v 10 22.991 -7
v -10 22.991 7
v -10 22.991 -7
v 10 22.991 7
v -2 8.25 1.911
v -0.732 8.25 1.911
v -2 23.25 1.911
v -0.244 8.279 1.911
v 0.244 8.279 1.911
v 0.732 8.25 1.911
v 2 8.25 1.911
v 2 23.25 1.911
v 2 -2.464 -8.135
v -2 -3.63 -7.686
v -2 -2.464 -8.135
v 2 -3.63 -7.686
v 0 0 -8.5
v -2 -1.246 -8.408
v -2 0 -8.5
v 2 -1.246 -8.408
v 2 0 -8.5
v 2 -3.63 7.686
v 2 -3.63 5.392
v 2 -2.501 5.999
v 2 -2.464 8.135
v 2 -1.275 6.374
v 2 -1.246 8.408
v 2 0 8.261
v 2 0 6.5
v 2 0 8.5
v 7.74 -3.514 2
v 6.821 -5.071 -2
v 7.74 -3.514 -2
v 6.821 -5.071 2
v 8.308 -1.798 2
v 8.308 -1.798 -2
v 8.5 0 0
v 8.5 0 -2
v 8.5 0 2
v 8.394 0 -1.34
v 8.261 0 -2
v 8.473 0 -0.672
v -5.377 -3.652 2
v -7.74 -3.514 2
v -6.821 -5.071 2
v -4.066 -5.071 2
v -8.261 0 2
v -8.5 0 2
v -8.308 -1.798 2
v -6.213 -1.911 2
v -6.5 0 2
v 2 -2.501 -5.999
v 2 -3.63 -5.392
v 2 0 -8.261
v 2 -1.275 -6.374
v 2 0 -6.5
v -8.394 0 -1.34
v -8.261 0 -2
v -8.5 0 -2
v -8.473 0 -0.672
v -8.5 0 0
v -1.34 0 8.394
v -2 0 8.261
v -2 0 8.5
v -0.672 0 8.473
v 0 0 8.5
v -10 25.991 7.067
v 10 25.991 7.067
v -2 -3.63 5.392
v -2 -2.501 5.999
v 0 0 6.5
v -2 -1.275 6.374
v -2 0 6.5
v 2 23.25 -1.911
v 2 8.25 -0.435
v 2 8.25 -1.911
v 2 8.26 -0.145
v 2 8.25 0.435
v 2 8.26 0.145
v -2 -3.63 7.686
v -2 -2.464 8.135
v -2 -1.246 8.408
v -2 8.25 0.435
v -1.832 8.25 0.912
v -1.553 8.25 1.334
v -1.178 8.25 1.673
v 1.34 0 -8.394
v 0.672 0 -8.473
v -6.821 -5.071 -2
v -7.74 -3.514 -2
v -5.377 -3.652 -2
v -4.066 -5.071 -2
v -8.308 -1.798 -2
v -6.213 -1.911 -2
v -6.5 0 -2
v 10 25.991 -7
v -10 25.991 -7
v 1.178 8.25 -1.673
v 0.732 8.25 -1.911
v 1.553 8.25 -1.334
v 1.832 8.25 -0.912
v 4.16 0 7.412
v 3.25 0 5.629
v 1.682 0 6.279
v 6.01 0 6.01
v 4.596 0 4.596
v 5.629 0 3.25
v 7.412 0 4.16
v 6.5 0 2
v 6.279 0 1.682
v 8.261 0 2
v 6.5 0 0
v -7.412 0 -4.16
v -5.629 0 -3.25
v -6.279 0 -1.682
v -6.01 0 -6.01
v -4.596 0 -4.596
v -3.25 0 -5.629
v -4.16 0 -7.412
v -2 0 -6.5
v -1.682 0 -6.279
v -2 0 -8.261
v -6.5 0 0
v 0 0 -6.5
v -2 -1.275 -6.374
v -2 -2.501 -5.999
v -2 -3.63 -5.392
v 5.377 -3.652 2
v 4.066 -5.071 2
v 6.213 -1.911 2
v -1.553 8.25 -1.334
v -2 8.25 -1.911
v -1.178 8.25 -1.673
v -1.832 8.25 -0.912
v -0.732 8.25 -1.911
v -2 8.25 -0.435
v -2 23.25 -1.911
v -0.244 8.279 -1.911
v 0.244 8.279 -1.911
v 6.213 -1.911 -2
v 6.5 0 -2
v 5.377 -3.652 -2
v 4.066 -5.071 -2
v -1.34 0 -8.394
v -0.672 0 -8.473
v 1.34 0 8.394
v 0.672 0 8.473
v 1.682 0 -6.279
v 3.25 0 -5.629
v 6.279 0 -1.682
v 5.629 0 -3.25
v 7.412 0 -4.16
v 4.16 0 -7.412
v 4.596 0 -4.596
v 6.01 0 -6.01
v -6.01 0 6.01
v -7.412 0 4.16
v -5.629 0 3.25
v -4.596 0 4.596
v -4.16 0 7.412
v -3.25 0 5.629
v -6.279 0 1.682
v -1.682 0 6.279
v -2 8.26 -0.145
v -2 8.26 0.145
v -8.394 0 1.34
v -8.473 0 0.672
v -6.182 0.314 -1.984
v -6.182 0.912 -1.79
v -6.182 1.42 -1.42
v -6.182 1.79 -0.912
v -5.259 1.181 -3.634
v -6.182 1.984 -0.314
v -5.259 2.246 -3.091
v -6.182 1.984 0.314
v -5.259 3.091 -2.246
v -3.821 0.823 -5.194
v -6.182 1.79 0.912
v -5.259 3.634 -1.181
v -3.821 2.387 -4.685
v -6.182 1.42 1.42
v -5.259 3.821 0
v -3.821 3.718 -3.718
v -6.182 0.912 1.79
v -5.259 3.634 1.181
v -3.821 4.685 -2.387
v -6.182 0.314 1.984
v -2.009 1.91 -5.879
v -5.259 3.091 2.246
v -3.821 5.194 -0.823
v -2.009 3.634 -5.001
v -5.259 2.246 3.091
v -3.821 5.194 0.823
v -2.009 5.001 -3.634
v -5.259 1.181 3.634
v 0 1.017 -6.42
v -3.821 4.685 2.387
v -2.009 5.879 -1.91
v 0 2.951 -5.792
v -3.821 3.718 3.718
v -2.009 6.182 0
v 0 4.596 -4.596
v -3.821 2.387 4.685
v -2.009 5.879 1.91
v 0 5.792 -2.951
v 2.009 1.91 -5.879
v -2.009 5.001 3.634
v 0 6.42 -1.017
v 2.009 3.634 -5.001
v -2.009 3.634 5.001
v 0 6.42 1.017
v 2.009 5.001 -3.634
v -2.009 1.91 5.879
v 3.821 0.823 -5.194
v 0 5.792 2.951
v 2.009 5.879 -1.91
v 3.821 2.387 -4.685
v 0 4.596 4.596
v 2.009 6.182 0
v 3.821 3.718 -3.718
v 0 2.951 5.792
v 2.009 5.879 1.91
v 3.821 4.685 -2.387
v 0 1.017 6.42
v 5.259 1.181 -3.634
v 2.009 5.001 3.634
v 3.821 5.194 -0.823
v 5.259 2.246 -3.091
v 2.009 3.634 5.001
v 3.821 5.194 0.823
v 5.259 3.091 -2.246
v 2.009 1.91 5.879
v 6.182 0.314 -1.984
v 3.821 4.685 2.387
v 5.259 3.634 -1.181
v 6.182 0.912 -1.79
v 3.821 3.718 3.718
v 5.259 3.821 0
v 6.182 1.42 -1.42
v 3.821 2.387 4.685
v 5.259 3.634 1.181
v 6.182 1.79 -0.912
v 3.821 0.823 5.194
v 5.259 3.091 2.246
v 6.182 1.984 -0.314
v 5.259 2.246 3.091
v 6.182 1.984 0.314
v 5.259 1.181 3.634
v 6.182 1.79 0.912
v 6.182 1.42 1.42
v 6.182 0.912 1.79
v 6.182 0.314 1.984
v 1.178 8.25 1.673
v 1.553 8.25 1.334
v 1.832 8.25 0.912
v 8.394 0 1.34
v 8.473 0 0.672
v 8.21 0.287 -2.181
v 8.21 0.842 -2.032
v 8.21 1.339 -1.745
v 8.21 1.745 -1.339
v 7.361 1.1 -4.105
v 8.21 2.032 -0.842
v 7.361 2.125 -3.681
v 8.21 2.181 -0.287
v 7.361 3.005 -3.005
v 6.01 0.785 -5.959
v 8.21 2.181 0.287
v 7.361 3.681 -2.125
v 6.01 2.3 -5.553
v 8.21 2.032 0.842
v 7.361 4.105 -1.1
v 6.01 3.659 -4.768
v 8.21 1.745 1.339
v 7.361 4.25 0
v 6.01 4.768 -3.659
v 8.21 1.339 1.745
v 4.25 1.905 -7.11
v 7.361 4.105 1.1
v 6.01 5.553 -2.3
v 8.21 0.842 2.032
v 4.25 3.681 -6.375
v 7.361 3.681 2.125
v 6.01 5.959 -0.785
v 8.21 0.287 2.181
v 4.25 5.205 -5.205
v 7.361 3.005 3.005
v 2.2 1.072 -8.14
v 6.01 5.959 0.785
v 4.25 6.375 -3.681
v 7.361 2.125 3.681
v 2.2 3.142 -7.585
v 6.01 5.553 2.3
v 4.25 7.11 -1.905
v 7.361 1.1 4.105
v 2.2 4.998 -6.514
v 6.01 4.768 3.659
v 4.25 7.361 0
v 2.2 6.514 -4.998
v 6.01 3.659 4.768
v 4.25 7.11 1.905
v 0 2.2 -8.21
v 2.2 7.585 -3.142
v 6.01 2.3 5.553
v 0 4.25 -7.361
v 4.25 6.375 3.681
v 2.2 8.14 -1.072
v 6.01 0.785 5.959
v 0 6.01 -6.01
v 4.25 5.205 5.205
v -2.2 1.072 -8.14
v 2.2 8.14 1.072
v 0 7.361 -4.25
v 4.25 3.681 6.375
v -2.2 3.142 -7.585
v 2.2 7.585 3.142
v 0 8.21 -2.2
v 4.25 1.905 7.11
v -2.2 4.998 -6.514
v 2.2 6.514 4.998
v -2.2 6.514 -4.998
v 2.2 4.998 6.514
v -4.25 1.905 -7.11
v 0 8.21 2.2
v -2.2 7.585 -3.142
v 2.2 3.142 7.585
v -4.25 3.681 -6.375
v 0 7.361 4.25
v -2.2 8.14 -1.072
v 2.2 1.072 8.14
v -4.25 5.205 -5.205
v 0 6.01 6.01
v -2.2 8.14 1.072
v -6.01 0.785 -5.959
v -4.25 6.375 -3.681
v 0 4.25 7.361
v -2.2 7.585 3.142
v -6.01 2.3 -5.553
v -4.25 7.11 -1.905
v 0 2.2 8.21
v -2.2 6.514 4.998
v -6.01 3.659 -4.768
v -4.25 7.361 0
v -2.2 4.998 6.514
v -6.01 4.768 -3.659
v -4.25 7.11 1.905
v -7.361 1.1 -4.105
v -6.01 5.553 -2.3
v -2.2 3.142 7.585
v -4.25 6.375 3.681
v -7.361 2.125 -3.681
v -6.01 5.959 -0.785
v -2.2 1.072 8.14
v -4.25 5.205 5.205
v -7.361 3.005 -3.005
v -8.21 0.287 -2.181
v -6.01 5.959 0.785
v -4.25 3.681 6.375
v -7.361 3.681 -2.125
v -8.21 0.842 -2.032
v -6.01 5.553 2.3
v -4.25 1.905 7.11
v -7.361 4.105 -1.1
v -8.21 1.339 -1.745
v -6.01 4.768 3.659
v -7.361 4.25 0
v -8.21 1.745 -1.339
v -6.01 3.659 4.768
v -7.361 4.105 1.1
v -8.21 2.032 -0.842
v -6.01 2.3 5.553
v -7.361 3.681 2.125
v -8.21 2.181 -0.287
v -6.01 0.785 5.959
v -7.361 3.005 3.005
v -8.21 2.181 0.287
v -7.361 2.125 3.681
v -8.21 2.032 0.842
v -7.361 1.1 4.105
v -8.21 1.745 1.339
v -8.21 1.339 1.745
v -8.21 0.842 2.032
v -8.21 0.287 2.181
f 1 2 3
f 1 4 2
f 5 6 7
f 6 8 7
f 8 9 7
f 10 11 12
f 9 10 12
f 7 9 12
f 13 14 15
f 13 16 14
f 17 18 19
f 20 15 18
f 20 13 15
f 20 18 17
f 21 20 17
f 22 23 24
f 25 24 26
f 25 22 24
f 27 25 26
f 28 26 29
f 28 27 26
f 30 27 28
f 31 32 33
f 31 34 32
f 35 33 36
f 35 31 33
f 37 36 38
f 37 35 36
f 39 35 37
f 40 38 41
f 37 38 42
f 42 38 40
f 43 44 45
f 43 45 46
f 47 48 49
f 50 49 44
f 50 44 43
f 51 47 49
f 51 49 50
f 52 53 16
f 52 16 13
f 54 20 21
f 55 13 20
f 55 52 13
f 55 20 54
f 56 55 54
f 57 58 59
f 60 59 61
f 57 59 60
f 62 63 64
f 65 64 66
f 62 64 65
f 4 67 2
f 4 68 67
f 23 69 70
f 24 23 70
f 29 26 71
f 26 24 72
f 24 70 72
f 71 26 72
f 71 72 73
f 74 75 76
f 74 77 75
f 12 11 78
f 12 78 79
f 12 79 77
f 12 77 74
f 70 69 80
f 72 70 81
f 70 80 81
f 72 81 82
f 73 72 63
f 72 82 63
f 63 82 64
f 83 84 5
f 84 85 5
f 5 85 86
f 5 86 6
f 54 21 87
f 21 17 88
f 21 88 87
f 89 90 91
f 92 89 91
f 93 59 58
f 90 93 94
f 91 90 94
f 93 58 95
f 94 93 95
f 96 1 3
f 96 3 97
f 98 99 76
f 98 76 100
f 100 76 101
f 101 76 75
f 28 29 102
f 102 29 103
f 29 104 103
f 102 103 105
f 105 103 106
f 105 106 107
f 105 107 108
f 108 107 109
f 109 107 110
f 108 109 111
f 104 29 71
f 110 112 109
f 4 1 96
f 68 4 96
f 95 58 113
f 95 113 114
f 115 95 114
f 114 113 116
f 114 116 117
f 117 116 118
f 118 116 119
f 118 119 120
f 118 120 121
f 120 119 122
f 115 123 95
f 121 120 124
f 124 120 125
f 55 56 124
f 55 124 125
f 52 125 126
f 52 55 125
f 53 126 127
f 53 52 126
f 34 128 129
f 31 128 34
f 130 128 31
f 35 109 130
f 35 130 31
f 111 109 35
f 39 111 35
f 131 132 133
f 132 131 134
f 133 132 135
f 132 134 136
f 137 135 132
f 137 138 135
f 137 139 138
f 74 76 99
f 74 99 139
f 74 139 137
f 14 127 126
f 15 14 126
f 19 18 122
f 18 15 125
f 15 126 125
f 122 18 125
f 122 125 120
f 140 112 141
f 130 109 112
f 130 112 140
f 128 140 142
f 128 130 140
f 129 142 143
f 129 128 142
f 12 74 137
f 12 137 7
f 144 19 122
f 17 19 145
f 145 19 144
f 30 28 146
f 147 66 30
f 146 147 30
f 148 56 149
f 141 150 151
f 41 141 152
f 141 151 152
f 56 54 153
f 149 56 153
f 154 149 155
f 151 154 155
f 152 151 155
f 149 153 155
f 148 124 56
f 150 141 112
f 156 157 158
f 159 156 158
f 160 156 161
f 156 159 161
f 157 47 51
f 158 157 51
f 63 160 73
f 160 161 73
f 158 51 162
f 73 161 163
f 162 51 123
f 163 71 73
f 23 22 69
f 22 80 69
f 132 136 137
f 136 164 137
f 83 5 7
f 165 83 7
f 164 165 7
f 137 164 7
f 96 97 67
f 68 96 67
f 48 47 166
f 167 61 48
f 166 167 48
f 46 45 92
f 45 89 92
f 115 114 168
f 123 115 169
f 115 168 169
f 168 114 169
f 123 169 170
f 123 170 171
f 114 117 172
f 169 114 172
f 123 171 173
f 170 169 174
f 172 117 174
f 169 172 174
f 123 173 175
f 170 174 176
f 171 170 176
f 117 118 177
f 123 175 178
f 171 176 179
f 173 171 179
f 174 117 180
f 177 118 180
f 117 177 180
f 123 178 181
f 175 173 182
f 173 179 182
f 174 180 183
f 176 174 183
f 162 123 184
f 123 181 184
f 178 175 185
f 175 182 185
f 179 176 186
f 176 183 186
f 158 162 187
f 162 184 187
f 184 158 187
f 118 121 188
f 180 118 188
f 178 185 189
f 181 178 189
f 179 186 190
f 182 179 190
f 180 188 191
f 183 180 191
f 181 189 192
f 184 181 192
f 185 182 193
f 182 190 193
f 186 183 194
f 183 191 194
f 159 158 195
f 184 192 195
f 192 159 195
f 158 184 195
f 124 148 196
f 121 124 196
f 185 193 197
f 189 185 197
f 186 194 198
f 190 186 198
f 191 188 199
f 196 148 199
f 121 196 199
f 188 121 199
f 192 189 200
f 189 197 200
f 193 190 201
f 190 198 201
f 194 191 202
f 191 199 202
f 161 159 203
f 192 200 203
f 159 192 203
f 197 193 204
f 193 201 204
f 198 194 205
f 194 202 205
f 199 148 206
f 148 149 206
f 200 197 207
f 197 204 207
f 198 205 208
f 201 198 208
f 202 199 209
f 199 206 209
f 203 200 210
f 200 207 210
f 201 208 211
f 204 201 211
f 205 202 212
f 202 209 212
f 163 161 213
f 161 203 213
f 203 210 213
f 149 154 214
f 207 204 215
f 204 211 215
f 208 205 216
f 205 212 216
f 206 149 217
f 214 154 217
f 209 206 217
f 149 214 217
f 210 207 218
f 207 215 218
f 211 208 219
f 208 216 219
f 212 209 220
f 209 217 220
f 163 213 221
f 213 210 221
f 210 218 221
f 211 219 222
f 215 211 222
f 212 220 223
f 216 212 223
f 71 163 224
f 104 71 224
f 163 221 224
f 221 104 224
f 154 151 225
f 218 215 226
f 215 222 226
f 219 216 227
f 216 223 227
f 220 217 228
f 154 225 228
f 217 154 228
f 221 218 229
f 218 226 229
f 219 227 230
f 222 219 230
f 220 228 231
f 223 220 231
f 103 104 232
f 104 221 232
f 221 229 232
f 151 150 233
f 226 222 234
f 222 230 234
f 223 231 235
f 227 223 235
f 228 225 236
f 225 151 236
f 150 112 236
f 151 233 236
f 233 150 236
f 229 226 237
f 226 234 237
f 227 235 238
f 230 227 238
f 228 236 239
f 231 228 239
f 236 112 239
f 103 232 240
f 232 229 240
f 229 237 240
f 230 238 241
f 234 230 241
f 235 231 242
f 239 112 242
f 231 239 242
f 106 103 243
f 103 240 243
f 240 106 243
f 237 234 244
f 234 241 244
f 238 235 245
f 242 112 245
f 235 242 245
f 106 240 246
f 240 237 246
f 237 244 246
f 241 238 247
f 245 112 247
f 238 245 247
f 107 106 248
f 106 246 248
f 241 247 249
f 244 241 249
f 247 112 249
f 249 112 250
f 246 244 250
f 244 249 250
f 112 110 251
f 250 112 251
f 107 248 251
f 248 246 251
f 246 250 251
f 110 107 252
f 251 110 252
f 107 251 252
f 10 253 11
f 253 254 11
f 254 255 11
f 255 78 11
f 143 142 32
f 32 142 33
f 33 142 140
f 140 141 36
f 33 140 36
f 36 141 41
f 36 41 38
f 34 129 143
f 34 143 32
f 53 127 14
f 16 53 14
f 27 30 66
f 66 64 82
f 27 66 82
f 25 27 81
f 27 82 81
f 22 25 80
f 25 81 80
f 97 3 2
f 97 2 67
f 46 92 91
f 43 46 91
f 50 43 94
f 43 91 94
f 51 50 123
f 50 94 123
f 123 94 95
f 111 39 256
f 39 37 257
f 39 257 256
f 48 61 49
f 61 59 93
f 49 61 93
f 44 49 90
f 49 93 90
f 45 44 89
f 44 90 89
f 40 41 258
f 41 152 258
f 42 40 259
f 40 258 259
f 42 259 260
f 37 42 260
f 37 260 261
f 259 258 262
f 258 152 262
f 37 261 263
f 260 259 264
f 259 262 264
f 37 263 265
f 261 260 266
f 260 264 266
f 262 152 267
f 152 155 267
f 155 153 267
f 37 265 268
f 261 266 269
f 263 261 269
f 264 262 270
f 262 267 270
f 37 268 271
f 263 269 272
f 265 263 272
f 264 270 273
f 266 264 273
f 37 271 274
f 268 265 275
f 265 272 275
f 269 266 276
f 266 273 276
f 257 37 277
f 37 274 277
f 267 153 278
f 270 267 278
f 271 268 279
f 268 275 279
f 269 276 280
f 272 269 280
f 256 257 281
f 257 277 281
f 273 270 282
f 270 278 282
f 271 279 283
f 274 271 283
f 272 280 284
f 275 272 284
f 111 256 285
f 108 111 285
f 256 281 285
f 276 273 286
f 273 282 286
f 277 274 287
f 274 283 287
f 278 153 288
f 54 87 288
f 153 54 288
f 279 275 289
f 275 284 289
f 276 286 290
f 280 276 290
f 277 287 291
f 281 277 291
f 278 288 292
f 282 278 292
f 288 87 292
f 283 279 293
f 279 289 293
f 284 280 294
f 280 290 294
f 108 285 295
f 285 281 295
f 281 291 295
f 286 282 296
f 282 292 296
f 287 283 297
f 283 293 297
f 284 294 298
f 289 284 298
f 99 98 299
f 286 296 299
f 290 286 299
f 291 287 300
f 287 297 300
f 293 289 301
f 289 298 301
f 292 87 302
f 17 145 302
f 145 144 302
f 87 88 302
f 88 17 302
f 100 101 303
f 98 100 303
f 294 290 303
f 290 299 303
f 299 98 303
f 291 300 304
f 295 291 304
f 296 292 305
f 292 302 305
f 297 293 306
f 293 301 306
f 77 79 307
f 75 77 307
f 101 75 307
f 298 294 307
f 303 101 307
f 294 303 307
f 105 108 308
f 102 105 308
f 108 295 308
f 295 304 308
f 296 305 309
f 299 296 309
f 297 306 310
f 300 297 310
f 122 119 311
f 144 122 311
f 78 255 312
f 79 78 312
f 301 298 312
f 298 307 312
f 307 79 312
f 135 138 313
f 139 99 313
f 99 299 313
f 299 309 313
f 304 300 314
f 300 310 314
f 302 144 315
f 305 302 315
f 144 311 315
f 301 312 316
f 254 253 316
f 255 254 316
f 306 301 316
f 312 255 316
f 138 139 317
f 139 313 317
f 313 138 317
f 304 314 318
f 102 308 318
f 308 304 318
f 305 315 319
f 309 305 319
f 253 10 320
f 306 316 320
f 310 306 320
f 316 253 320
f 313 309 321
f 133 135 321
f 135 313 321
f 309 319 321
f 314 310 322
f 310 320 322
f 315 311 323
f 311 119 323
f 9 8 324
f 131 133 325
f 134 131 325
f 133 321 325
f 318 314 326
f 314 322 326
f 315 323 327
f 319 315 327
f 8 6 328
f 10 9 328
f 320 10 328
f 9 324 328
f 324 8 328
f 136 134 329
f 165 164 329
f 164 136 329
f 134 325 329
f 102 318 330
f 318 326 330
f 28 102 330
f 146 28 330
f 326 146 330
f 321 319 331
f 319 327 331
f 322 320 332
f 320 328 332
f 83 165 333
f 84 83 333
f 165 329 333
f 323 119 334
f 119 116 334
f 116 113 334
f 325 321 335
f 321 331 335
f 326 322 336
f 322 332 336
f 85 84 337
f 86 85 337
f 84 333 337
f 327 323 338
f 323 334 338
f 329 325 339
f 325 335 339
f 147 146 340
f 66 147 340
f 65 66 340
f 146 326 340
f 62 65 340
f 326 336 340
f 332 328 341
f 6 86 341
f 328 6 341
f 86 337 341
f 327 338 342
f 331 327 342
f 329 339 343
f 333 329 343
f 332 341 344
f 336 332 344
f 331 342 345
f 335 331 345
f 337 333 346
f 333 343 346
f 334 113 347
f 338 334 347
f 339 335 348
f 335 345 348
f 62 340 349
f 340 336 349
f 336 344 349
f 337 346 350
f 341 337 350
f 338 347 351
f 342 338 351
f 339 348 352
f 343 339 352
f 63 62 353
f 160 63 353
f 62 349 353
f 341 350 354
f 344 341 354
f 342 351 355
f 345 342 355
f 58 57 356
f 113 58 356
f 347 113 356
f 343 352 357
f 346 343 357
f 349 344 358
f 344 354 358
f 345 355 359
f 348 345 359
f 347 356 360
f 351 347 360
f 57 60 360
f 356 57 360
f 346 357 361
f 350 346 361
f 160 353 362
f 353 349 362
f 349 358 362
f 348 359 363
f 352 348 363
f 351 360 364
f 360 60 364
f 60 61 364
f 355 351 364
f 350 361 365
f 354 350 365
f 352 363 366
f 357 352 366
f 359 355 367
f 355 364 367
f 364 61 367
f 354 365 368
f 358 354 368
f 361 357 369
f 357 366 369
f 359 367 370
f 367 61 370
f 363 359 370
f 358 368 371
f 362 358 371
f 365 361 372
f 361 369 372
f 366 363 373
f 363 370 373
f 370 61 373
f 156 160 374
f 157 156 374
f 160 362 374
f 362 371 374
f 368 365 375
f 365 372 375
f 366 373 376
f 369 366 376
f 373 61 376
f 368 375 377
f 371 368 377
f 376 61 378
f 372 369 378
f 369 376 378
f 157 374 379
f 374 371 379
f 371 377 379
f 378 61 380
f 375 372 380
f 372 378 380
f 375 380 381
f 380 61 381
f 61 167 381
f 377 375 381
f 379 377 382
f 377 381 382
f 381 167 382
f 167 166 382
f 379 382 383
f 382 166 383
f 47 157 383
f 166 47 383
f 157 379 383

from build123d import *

# Parameters (mm, degrees)
F1_ANGLE_BACK = 90
F1_ANGLE      = 180
F3_DEPTH      = 2
F5_DEPTH      = 2
F6_W          = 15
F6_H          = 3.8226658944
F7_DEPTH      = 2
F9_DEPTH      = 10


# Not quite as in the source:
# - the program builds the solid bodies; features that only make, move or delete a surface that nothing else refers to are left out


with BuildPart() as f1:
    # F0 (on Top) → F1 (revolve)
    with BuildSketch(Plane.XY, mode=Mode.PRIVATE) as f1_sk:
        with BuildLine():
            ThreePointArc((-6.5, 0), (0, 6.5), (6.5, 0))
            Line((6.5, 0), (8.5, 0))
            ThreePointArc((8.5, 0), (0, 8.5), (-8.5, 0))
            Line((-8.5, 0), (-6.5, 0))
        make_face()
    revolve(f1_sk.sketch.rotate(Axis((7.5, 0, 0), (1, 0, 0)), -F1_ANGLE_BACK), axis=Axis((7.5, 0, 0), (1, 0, 0)), revolution_arc=F1_ANGLE)

    # F2 (on Top) → F3 (join, symmetric)
    with BuildSketch(Plane.XY):
        with BuildLine():
            Line((-6.5, 0), (-8.5, 0))
            ThreePointArc((-8.5, 0), (-8.06943757, -2.6709880764), (-6.8213700461, -5.0713815371))
            Line((-6.8213700461, -5.0713815371), (-4.0658442304, -5.0713815371))
            ThreePointArc((-4.0658442304, -5.0713815371), (-5.8599482718, -2.8126511073), (-6.5, 0))
        make_face()
        with BuildLine():
            Line((8.5, 0), (6.5, 0))
            ThreePointArc((6.5, 0), (5.8599482718, -2.8126511073), (4.0658442304, -5.0713815371))
            Line((4.0658442304, -5.0713815371), (6.8213700461, -5.0713815371))
            ThreePointArc((6.8213700461, -5.0713815371), (8.06943757, -2.6709880764), (8.5, 0))
        make_face()
    extrude(amount=F3_DEPTH, both=True)

    # F4 (on Right) → F5 (join, symmetric)
    with BuildSketch(Plane.YZ):
        with BuildLine():
            Line((0, 6.5), (0, 8.5))
            ThreePointArc((0, 8.5), (-1.8599634185, 8.2940060334), (-3.6297759564, 7.6860084898))
            Line((-3.6297759564, 7.6860084898), (-3.6297759564, 5.3920985253))
            ThreePointArc((-3.6297759564, 5.3920985253), (-1.8975457288, 6.2168577438), (0, 6.5))
        make_face()
        with BuildLine():
            Line((0, -8.5), (0, -6.5))
            ThreePointArc((0, -6.5), (-1.8975457288, -6.2168577438), (-3.6297759564, -5.3920985253))
            Line((-3.6297759564, -5.3920985253), (-3.6297759564, -7.6860084898))
            ThreePointArc((-3.6297759564, -7.6860084898), (-1.8599634185, -8.2940060334), (0, -8.5))
        make_face()
    extrude(amount=F5_DEPTH, both=True)

    # F6 (on Right) → F7 (join, symmetric)
    with BuildSketch(Plane.YZ):
        with Locations((15.7498891279, 0)):
            Rectangle(F6_W, F6_H)
    extrude(amount=F7_DEPTH, both=True)


with BuildPart() as f9:
    # F8 (on Right) → F9 (new body, symmetric)
    with BuildSketch(Plane.YZ):
        Polygon((22.991493836, 7), (22.991493836, 0), (22.991493836, -7), (25.991493836, -7), (25.991493836, 7.0670126006), align=None)
    extrude(amount=F9_DEPTH, both=True)


solid = Compound([f1.part, f9.part])
